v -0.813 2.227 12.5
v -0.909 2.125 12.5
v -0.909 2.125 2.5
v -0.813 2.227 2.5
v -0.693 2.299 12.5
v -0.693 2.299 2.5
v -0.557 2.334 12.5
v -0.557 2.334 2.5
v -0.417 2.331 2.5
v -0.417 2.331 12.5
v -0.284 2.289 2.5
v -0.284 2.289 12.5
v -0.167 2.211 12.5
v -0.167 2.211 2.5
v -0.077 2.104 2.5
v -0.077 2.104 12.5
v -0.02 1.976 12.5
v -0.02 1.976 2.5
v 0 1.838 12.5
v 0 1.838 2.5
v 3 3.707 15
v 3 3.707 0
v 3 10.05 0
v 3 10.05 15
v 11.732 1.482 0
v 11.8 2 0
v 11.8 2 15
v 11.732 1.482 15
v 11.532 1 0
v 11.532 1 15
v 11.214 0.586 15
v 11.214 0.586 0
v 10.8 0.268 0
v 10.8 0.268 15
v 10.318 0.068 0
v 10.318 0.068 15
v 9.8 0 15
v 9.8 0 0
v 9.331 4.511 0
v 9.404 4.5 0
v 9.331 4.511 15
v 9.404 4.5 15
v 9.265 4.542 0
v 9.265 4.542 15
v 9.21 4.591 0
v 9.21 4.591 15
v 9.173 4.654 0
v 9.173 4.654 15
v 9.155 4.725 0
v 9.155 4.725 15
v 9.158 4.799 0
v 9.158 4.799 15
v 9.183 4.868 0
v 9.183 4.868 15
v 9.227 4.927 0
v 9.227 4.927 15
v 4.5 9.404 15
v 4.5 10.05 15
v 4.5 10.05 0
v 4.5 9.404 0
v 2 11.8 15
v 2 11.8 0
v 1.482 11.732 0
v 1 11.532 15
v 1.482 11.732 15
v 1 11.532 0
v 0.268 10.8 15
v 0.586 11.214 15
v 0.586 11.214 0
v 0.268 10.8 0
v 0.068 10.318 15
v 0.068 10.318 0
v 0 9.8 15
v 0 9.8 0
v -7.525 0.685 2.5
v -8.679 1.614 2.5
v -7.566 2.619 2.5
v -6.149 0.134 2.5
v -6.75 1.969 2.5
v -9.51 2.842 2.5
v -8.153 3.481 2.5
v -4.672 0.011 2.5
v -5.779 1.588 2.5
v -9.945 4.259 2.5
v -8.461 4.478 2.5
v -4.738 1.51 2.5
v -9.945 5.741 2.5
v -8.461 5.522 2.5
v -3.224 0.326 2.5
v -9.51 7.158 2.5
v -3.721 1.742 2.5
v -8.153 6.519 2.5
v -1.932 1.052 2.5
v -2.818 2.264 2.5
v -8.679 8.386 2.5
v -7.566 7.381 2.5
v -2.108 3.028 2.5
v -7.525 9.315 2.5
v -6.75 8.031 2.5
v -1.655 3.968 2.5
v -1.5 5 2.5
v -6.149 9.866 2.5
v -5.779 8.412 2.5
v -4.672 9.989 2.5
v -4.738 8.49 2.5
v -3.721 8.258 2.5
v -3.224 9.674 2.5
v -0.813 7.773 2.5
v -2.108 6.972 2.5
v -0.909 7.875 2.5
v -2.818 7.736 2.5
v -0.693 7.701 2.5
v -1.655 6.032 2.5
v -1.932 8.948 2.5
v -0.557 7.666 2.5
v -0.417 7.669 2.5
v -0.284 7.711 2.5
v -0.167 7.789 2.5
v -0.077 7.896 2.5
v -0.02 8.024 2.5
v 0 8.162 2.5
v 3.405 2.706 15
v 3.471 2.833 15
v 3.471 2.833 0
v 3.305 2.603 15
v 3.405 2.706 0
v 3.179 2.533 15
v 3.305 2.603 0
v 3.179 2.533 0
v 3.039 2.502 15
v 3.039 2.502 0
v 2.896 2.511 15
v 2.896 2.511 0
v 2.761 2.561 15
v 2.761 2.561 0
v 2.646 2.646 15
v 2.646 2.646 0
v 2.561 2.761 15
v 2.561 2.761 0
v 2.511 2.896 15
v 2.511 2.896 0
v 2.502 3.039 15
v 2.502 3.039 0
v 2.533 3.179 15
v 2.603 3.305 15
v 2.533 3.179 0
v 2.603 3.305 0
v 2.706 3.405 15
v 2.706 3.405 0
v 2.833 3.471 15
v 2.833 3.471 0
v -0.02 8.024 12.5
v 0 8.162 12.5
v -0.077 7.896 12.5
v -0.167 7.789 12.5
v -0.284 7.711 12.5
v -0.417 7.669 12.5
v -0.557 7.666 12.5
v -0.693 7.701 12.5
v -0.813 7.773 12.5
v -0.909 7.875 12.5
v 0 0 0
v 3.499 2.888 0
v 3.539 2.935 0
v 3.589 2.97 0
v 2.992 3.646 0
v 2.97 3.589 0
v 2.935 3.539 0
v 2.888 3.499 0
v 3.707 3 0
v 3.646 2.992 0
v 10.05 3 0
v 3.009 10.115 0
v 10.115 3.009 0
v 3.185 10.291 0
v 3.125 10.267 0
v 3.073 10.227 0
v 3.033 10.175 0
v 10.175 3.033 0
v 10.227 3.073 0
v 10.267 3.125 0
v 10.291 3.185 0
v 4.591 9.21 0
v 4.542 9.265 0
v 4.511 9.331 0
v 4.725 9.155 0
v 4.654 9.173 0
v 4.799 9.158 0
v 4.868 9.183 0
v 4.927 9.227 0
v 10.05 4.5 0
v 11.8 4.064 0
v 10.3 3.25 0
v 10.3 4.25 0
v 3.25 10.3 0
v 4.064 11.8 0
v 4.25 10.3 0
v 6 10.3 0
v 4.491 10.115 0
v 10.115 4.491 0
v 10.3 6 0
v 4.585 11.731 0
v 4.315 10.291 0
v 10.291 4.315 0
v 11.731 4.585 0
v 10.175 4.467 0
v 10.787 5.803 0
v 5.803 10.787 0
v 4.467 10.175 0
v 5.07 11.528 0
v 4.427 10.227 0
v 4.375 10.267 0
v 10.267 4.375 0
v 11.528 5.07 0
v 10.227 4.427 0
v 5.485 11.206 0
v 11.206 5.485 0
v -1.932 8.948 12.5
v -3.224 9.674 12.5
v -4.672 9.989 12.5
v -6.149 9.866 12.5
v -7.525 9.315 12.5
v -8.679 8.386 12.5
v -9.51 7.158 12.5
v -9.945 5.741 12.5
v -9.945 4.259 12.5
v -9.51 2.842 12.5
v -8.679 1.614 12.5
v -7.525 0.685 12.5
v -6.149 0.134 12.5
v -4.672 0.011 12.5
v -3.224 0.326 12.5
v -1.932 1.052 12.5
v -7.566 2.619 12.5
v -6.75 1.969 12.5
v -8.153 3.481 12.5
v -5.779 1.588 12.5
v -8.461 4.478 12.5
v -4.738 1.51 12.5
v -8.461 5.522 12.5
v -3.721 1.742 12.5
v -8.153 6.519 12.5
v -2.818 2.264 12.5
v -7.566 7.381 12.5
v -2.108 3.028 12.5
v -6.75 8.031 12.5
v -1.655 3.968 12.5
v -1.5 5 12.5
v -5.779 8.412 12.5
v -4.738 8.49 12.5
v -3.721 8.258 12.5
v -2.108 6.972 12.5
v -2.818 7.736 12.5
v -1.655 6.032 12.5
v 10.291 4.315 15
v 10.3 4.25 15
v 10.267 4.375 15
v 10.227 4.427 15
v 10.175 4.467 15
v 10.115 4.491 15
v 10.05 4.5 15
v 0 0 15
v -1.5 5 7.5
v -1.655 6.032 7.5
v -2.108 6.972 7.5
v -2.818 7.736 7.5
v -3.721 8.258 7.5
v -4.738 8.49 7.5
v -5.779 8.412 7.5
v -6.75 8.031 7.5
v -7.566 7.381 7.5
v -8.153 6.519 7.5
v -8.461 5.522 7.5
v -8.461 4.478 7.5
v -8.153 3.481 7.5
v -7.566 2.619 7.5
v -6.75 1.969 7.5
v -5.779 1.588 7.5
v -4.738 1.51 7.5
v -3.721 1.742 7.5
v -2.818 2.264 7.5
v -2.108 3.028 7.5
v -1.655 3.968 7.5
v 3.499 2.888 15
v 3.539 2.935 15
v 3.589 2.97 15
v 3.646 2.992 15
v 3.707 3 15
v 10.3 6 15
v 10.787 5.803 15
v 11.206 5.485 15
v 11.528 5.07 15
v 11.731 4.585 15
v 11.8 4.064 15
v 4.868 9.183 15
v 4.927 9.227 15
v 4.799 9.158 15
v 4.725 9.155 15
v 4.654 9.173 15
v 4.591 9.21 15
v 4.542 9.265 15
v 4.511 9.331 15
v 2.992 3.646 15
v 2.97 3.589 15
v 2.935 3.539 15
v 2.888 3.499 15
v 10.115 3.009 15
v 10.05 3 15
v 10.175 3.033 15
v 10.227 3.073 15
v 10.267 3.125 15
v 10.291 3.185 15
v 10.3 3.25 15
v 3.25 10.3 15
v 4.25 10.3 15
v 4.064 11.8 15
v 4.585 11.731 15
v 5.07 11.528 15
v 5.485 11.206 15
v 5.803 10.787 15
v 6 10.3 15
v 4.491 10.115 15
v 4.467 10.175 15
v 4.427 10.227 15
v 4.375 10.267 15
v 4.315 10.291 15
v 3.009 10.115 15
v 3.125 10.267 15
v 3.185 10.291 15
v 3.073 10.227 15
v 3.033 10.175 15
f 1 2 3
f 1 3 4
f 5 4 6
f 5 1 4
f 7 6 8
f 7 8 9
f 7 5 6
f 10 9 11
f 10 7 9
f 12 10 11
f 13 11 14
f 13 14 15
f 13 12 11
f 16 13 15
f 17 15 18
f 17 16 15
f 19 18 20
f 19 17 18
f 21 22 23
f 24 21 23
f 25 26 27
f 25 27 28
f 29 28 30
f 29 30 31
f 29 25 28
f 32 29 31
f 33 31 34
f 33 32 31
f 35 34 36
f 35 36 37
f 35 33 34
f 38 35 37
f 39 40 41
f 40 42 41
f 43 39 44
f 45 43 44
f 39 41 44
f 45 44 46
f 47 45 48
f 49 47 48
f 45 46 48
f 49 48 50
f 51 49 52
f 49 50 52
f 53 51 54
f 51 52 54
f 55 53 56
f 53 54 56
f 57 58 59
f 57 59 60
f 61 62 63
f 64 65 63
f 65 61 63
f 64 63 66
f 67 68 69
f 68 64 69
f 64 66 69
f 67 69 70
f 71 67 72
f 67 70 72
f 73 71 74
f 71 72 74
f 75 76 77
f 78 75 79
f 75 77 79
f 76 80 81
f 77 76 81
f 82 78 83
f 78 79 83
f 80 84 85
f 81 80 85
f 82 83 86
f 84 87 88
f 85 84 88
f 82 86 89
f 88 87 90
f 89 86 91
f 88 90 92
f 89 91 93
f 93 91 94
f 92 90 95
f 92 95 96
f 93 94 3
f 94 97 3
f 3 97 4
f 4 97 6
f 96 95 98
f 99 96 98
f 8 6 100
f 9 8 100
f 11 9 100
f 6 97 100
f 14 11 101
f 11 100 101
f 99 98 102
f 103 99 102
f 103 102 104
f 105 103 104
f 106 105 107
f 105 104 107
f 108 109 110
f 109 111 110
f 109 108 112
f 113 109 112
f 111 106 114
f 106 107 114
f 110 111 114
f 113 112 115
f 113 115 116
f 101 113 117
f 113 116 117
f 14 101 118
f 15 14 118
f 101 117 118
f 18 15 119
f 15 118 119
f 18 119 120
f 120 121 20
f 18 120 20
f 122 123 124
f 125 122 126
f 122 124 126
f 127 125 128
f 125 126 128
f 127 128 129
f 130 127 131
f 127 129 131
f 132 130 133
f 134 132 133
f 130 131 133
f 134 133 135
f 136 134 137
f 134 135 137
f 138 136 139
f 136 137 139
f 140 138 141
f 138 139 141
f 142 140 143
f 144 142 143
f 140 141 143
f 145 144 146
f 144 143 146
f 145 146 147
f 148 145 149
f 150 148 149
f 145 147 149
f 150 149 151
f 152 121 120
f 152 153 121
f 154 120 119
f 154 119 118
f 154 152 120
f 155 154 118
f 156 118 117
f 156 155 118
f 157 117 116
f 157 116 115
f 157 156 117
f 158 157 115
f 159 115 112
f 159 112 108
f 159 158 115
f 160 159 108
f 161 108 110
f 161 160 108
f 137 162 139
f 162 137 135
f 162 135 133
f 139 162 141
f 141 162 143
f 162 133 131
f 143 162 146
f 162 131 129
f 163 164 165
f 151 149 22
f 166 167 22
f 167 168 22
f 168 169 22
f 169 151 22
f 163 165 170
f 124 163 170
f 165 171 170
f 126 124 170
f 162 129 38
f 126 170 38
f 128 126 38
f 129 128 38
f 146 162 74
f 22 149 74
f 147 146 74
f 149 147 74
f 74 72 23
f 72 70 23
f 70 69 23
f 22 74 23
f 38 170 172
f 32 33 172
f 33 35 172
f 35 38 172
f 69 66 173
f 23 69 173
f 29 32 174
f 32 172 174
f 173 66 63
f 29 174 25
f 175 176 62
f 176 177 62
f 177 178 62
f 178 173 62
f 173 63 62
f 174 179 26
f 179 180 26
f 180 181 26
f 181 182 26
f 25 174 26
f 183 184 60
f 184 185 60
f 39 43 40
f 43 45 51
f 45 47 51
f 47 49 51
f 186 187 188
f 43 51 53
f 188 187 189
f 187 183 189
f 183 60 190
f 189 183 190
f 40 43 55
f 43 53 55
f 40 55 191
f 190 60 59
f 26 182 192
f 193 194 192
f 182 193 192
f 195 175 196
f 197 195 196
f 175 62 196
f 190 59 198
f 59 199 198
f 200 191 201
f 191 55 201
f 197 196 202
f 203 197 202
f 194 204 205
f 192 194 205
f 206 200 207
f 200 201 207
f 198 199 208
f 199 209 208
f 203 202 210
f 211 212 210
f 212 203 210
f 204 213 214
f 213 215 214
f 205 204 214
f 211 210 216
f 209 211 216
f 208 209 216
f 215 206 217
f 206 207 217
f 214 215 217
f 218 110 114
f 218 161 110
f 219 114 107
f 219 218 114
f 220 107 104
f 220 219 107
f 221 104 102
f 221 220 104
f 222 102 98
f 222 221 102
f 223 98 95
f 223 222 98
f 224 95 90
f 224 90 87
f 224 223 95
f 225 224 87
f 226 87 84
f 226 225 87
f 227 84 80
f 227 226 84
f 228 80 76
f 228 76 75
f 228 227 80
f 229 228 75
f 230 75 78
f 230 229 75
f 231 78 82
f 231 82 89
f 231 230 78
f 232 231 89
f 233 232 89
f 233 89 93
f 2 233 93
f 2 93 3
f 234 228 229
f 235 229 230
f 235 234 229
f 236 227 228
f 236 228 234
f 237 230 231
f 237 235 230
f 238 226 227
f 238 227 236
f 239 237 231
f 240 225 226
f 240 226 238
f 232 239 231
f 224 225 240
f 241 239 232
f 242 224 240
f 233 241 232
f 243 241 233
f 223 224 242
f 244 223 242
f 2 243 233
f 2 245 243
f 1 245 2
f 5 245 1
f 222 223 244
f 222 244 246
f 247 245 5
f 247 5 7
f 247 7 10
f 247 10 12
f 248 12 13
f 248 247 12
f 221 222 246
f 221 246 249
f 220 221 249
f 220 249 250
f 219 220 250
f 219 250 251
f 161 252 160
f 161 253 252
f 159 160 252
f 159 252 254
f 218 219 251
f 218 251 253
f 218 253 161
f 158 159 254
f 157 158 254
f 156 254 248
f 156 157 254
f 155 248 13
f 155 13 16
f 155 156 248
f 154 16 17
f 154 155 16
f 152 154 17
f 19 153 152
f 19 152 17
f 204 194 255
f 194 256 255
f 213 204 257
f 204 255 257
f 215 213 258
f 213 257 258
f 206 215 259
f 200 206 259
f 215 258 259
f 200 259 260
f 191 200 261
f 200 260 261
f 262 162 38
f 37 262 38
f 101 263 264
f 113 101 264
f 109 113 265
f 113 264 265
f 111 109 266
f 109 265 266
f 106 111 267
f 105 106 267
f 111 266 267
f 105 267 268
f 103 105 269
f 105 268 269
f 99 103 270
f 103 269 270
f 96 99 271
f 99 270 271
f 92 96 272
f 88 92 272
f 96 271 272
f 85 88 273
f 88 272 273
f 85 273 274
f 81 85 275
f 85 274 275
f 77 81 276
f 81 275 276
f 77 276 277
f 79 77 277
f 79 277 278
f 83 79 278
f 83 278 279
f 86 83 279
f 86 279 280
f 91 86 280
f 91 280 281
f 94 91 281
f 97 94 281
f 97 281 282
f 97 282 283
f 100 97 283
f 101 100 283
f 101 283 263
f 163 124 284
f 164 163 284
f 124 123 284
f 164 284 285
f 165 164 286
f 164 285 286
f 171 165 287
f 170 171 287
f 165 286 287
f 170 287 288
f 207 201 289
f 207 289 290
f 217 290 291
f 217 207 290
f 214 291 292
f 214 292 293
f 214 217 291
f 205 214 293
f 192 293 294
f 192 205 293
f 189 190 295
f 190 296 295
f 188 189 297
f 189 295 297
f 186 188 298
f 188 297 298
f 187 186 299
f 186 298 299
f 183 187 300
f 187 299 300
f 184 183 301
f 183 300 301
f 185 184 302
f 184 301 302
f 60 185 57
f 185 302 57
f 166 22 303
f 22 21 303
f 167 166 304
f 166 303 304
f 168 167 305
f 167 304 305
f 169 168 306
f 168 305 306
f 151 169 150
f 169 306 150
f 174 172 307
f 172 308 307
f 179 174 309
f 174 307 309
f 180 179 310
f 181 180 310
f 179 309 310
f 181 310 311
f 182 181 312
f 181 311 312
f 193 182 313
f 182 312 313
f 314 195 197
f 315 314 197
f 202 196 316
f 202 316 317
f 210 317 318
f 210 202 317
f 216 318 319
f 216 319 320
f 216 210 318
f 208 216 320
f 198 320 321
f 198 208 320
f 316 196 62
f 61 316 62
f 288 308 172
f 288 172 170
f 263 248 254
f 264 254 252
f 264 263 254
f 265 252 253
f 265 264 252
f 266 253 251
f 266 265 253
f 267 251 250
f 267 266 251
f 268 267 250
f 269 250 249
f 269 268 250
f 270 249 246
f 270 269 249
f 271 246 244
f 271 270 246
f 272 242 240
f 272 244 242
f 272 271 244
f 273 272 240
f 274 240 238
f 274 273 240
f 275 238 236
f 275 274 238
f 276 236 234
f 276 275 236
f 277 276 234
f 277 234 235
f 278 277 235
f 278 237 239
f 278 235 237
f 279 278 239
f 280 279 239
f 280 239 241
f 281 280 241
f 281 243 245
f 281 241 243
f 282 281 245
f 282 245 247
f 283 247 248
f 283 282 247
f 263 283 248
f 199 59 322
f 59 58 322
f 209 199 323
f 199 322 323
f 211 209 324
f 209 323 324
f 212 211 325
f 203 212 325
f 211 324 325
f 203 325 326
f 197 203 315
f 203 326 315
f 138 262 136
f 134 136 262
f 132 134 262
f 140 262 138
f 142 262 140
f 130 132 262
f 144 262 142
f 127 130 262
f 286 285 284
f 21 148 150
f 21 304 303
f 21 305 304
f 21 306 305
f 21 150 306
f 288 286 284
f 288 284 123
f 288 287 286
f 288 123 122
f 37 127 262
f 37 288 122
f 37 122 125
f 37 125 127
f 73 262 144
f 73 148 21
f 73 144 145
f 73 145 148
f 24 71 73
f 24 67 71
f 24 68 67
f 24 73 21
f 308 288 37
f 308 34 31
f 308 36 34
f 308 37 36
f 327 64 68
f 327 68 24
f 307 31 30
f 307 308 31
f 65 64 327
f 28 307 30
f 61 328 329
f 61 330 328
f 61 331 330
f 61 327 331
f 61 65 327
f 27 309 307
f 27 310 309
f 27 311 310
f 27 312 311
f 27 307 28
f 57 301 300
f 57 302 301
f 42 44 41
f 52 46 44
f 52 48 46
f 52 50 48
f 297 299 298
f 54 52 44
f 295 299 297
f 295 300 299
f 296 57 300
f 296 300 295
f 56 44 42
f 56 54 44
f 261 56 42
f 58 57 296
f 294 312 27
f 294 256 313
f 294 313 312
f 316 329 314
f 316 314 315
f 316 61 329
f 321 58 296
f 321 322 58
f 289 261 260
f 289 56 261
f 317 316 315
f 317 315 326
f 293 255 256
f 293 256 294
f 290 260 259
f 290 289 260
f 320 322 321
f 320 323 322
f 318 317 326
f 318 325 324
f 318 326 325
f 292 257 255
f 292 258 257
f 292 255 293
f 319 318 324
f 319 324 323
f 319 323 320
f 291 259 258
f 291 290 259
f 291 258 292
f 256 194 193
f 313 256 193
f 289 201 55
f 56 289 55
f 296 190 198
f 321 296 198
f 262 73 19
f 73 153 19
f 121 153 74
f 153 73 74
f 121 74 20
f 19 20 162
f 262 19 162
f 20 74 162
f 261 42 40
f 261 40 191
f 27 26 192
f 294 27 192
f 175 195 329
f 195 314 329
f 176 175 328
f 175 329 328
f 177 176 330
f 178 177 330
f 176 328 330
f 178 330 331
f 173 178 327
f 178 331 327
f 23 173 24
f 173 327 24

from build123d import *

# Parameters (mm, degrees)
F1_DEPTH      = 15
F2_T1_DEPTH   = 25
F2_T3_DEPTH   = 24.6824583655
F3_R          = 0.25
F6_DEPTH      = 5
F7_R          = 3.5
F8_DEPTH      = 7.501
F8_DEPTH_BACK = 7.501


# Not quite as in the source:
# - a fillet or chamfer that OpenCascade refuses, or shapes differently, is made with other operations: its cross-section is extruded or revolved along the edge and cut away or added
# - a feature names something its author has since deleted; it is built from what else it names


with BuildPart() as f1:
    # F0 (on Top) → F1 (new body)
    with BuildSketch(Plane.XY):
        with BuildLine():
            Line((3, 11.8), (0, 11.8))
            Line((0, 11.8), (0, 0))
            Line((0, 0), (11.8, 0))
            Line((11.8, 0), (11.8, 3))
            Line((11.8, 3), (11.8, 6))
            Line((11.8, 6), (10.3, 6))
            Line((10.3, 6), (8.8, 4.5))
            Line((8.8, 4.5), (10.3, 4.5))
            Line((10.3, 4.5), (10.3, 3))
            Line((10.3, 3), (3.5, 3))
            ThreePointArc((3.5, 3), (2.6464466094, 2.6464466094), (3, 3.5))
            Line((3, 3.5), (3, 10.3))
            Line((3, 10.3), (4.5, 10.3))
            Line((4.5, 10.3), (4.5, 8.8))
            Line((4.5, 8.8), (6, 10.3))
            Line((6, 10.3), (6, 11.8))
            Line((6, 11.8), (3, 11.8))
        make_face()
    extrude(amount=F1_DEPTH)

    # F2: fillet of radius 2 on 4 edges, made by hand

    # F2_s2 → F2_t1 (cut)
    with BuildSketch(Plane.XY.offset(-5)):
        with BuildLine():
            ThreePointArc((2, 11.8), (0.5857864376, 11.2142135624), (0, 9.8))
            Line((0, 9.8), (0, 11.8))
            Line((0, 11.8), (2, 11.8))
        make_face()
        with BuildLine():
            ThreePointArc((11.8, 2), (11.2142135624, 0.5857864376), (9.8, 0))
            Line((9.8, 0), (11.8, 0))
            Line((11.8, 0), (11.8, 2))
        make_face()
    extrude(amount=F2_T1_DEPTH, mode=Mode.SUBTRACT)

    # F2_s4 → F2_t3 (cut)
    with BuildSketch(Plane.XY.offset(-4.8412291828)):
        with BuildLine():
            ThreePointArc((4.0635083269, 11.8), (5.2882531983, 11.3811388301), (6, 10.3))
            Line((6, 10.3), (6, 11.8))
            Line((6, 11.8), (4.0635083269, 11.8))
        make_face()
        with BuildLine():
            ThreePointArc((10.3, 6), (11.3811388301, 5.2882531983), (11.8, 4.0635083269))
            Line((11.8, 4.0635083269), (11.8, 6))
            Line((11.8, 6), (10.3, 6))
        make_face()
    extrude(amount=F2_T3_DEPTH, mode=Mode.SUBTRACT)

    # F3
    f3_edges = [f1.edges().sort_by_distance(p)[0] for p in [
        (3, 10.3, 7.5),
        (4.5, 10.3, 7.5),
        (4.5, 8.8, 7.5),
        (3, 3.5, 7.5),
        (3.5, 3, 7.5),
        (10.3, 4.5, 7.5),
        (8.8, 4.5, 7.5),
        (10.3, 3, 7.5),
    ]]
    fillet(f3_edges, radius=F3_R)

    # F5 (on mid) → F6 (join, symmetric)
    with BuildSketch(Plane.XY.offset(7.5)):
        with BuildLine():
            ThreePointArc((-0.9090909212, 2.1252021099), (-0.2326870569, 3.4924432671), (0, 5))
            ThreePointArc((0, 5), (-0.2326870569, 6.5075567329), (-0.9090909212, 7.8747978901))
            ThreePointArc((-0.9090909212, 7.8747978901), (-10, 5), (-0.9090909212, 2.1252021099))
        make_face()
        with BuildLine():
            Line((0, 1.8377223398), (0, 5))
            ThreePointArc((0, 5), (-0.2326870569, 3.4924432671), (-0.9090909212, 2.1252021099))
            ThreePointArc((-0.9090909212, 2.1252021099), (-0.3492443377, 2.3144536376), (0, 1.8377223398))
        make_face()
        with BuildLine():
            ThreePointArc((-0.9090909212, 7.8747978901), (-0.2326870569, 6.5075567329), (0, 5))
            Line((0, 5), (0, 8.1622776602))
            ThreePointArc((0, 8.1622776602), (-0.3492443377, 7.6855463624), (-0.9090909212, 7.8747978901))
        make_face()
    extrude(amount=F6_DEPTH, both=True)

    # F7 (on mid) → F8 (cut, two sides)
    with BuildSketch(Plane.XY.offset(7.5)) as f8_sk:
        with Locations((-5, 5)):
            Circle(F7_R)
    extrude(amount=-F8_DEPTH, mode=Mode.SUBTRACT)
    extrude(f8_sk.sketch, amount=F8_DEPTH_BACK, mode=Mode.SUBTRACT)


solid = f1.part
